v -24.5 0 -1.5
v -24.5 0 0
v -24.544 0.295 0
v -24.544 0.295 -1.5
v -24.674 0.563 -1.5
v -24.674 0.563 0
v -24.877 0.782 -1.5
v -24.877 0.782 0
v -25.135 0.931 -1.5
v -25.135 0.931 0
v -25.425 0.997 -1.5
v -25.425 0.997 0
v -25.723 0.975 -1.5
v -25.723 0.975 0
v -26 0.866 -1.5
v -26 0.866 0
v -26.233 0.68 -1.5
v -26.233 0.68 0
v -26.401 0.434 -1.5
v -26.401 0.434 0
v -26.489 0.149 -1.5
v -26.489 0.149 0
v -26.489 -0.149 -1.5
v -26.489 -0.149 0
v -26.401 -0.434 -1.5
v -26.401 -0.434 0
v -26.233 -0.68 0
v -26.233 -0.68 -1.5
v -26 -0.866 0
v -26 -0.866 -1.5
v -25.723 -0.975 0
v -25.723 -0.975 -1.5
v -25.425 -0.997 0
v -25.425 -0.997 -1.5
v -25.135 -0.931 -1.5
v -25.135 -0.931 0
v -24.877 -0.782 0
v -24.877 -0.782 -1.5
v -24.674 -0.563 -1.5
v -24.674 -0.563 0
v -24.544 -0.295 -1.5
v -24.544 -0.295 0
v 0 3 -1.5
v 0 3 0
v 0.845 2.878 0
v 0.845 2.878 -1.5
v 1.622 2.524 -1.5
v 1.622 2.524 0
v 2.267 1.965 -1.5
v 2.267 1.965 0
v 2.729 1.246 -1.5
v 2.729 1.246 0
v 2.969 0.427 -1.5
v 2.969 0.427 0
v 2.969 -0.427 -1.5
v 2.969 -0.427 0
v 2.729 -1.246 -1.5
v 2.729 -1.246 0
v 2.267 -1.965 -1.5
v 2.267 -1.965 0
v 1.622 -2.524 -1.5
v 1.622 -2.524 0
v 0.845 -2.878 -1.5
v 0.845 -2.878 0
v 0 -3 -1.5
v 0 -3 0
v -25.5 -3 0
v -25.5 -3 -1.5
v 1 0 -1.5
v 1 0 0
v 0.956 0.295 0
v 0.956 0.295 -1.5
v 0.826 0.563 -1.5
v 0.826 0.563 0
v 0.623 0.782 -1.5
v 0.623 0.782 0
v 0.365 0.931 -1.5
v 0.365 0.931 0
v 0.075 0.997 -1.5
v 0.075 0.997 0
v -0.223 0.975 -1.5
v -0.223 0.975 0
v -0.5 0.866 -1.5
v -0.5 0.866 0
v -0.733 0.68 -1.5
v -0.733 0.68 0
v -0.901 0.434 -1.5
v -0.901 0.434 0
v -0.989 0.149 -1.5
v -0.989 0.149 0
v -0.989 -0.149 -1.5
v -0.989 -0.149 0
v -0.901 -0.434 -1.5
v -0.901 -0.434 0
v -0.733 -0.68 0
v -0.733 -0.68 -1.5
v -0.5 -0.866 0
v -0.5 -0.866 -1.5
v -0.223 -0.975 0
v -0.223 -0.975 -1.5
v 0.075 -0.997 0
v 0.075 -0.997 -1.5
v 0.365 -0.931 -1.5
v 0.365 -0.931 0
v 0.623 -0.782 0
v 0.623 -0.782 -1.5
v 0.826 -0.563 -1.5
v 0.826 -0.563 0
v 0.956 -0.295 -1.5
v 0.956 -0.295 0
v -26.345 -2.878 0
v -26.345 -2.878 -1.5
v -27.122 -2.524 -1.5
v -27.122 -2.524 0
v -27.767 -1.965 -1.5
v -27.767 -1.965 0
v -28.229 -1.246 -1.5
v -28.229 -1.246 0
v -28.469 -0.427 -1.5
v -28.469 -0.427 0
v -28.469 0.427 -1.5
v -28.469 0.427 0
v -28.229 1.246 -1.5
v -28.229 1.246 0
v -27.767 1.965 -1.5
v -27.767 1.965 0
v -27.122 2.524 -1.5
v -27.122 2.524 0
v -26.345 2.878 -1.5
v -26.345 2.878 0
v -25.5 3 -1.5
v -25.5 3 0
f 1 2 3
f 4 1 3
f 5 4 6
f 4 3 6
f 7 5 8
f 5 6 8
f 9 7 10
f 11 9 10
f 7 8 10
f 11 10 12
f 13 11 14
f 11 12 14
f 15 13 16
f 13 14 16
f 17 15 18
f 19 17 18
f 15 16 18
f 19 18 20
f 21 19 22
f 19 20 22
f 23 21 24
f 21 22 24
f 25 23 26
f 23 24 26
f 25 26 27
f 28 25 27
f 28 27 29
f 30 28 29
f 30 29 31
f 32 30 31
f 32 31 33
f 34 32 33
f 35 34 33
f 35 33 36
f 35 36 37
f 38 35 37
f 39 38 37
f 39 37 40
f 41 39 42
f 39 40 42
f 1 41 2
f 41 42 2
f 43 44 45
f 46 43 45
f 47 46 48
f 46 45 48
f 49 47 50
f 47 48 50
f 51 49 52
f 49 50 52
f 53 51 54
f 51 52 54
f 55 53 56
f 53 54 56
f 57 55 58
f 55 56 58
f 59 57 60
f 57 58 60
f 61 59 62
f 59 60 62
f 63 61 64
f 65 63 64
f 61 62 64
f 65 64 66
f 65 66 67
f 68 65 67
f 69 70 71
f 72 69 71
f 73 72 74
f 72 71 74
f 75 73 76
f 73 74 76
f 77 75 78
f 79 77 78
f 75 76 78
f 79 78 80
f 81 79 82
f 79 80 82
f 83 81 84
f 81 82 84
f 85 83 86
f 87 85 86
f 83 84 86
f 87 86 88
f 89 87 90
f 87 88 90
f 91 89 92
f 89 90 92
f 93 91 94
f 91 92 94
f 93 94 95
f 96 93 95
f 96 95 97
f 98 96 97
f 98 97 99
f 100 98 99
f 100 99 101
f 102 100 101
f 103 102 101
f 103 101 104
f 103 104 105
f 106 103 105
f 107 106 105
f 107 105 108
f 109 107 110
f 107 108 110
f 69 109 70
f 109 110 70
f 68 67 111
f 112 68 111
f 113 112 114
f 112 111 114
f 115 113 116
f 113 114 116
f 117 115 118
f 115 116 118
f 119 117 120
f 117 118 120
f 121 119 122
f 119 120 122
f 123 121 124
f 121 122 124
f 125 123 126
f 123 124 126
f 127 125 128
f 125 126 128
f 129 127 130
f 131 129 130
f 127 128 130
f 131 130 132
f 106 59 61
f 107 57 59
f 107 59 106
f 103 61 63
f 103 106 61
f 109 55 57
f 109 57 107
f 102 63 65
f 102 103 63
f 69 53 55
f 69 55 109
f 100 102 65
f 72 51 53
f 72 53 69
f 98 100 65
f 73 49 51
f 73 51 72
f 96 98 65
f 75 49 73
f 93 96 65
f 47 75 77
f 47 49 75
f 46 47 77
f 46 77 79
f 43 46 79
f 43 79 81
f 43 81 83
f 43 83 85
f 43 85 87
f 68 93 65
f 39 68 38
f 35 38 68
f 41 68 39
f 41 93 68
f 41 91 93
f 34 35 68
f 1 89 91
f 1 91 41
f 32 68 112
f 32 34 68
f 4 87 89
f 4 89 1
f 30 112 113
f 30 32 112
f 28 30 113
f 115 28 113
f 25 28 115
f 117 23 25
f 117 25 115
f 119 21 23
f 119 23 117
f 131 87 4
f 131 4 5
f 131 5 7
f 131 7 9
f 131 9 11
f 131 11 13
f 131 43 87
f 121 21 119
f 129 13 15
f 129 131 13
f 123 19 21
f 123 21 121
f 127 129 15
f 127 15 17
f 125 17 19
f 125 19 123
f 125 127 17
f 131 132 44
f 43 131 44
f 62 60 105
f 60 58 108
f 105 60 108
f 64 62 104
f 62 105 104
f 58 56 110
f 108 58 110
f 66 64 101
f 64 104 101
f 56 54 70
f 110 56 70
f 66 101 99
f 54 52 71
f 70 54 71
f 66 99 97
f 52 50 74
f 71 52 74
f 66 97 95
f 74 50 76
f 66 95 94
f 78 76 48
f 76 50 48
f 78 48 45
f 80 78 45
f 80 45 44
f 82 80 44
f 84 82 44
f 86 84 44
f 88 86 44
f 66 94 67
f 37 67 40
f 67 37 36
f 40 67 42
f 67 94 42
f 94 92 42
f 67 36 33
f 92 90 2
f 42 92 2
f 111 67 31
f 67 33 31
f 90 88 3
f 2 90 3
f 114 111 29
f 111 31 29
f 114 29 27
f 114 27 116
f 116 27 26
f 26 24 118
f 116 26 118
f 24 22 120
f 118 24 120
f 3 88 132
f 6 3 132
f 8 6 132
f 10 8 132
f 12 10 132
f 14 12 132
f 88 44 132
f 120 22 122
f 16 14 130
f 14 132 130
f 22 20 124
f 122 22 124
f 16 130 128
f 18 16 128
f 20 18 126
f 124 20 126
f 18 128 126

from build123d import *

# Parameters (mm, degrees)
ESQUISSE1_R      = 1
EXTRUSION1_DEPTH = 1.5


with BuildPart() as part:
    # Esquisse1 → Extrusion1 (new body)
    with BuildSketch(Plane.XY):
        with BuildLine():
            Line((-25.5, 3), (0, 3))
            ThreePointArc((0, 3), (3, 0), (0, -3))
            Line((0, -3), (-25.5, -3))
            ThreePointArc((-25.5, -3), (-28.5, 0), (-25.5, 3))
        make_face()
        Circle(ESQUISSE1_R, mode=Mode.SUBTRACT)
        with Locations((-25.5, 0)):
            Circle(ESQUISSE1_R, mode=Mode.SUBTRACT)
    extrude(amount=-EXTRUSION1_DEPTH)


solid = part.part
